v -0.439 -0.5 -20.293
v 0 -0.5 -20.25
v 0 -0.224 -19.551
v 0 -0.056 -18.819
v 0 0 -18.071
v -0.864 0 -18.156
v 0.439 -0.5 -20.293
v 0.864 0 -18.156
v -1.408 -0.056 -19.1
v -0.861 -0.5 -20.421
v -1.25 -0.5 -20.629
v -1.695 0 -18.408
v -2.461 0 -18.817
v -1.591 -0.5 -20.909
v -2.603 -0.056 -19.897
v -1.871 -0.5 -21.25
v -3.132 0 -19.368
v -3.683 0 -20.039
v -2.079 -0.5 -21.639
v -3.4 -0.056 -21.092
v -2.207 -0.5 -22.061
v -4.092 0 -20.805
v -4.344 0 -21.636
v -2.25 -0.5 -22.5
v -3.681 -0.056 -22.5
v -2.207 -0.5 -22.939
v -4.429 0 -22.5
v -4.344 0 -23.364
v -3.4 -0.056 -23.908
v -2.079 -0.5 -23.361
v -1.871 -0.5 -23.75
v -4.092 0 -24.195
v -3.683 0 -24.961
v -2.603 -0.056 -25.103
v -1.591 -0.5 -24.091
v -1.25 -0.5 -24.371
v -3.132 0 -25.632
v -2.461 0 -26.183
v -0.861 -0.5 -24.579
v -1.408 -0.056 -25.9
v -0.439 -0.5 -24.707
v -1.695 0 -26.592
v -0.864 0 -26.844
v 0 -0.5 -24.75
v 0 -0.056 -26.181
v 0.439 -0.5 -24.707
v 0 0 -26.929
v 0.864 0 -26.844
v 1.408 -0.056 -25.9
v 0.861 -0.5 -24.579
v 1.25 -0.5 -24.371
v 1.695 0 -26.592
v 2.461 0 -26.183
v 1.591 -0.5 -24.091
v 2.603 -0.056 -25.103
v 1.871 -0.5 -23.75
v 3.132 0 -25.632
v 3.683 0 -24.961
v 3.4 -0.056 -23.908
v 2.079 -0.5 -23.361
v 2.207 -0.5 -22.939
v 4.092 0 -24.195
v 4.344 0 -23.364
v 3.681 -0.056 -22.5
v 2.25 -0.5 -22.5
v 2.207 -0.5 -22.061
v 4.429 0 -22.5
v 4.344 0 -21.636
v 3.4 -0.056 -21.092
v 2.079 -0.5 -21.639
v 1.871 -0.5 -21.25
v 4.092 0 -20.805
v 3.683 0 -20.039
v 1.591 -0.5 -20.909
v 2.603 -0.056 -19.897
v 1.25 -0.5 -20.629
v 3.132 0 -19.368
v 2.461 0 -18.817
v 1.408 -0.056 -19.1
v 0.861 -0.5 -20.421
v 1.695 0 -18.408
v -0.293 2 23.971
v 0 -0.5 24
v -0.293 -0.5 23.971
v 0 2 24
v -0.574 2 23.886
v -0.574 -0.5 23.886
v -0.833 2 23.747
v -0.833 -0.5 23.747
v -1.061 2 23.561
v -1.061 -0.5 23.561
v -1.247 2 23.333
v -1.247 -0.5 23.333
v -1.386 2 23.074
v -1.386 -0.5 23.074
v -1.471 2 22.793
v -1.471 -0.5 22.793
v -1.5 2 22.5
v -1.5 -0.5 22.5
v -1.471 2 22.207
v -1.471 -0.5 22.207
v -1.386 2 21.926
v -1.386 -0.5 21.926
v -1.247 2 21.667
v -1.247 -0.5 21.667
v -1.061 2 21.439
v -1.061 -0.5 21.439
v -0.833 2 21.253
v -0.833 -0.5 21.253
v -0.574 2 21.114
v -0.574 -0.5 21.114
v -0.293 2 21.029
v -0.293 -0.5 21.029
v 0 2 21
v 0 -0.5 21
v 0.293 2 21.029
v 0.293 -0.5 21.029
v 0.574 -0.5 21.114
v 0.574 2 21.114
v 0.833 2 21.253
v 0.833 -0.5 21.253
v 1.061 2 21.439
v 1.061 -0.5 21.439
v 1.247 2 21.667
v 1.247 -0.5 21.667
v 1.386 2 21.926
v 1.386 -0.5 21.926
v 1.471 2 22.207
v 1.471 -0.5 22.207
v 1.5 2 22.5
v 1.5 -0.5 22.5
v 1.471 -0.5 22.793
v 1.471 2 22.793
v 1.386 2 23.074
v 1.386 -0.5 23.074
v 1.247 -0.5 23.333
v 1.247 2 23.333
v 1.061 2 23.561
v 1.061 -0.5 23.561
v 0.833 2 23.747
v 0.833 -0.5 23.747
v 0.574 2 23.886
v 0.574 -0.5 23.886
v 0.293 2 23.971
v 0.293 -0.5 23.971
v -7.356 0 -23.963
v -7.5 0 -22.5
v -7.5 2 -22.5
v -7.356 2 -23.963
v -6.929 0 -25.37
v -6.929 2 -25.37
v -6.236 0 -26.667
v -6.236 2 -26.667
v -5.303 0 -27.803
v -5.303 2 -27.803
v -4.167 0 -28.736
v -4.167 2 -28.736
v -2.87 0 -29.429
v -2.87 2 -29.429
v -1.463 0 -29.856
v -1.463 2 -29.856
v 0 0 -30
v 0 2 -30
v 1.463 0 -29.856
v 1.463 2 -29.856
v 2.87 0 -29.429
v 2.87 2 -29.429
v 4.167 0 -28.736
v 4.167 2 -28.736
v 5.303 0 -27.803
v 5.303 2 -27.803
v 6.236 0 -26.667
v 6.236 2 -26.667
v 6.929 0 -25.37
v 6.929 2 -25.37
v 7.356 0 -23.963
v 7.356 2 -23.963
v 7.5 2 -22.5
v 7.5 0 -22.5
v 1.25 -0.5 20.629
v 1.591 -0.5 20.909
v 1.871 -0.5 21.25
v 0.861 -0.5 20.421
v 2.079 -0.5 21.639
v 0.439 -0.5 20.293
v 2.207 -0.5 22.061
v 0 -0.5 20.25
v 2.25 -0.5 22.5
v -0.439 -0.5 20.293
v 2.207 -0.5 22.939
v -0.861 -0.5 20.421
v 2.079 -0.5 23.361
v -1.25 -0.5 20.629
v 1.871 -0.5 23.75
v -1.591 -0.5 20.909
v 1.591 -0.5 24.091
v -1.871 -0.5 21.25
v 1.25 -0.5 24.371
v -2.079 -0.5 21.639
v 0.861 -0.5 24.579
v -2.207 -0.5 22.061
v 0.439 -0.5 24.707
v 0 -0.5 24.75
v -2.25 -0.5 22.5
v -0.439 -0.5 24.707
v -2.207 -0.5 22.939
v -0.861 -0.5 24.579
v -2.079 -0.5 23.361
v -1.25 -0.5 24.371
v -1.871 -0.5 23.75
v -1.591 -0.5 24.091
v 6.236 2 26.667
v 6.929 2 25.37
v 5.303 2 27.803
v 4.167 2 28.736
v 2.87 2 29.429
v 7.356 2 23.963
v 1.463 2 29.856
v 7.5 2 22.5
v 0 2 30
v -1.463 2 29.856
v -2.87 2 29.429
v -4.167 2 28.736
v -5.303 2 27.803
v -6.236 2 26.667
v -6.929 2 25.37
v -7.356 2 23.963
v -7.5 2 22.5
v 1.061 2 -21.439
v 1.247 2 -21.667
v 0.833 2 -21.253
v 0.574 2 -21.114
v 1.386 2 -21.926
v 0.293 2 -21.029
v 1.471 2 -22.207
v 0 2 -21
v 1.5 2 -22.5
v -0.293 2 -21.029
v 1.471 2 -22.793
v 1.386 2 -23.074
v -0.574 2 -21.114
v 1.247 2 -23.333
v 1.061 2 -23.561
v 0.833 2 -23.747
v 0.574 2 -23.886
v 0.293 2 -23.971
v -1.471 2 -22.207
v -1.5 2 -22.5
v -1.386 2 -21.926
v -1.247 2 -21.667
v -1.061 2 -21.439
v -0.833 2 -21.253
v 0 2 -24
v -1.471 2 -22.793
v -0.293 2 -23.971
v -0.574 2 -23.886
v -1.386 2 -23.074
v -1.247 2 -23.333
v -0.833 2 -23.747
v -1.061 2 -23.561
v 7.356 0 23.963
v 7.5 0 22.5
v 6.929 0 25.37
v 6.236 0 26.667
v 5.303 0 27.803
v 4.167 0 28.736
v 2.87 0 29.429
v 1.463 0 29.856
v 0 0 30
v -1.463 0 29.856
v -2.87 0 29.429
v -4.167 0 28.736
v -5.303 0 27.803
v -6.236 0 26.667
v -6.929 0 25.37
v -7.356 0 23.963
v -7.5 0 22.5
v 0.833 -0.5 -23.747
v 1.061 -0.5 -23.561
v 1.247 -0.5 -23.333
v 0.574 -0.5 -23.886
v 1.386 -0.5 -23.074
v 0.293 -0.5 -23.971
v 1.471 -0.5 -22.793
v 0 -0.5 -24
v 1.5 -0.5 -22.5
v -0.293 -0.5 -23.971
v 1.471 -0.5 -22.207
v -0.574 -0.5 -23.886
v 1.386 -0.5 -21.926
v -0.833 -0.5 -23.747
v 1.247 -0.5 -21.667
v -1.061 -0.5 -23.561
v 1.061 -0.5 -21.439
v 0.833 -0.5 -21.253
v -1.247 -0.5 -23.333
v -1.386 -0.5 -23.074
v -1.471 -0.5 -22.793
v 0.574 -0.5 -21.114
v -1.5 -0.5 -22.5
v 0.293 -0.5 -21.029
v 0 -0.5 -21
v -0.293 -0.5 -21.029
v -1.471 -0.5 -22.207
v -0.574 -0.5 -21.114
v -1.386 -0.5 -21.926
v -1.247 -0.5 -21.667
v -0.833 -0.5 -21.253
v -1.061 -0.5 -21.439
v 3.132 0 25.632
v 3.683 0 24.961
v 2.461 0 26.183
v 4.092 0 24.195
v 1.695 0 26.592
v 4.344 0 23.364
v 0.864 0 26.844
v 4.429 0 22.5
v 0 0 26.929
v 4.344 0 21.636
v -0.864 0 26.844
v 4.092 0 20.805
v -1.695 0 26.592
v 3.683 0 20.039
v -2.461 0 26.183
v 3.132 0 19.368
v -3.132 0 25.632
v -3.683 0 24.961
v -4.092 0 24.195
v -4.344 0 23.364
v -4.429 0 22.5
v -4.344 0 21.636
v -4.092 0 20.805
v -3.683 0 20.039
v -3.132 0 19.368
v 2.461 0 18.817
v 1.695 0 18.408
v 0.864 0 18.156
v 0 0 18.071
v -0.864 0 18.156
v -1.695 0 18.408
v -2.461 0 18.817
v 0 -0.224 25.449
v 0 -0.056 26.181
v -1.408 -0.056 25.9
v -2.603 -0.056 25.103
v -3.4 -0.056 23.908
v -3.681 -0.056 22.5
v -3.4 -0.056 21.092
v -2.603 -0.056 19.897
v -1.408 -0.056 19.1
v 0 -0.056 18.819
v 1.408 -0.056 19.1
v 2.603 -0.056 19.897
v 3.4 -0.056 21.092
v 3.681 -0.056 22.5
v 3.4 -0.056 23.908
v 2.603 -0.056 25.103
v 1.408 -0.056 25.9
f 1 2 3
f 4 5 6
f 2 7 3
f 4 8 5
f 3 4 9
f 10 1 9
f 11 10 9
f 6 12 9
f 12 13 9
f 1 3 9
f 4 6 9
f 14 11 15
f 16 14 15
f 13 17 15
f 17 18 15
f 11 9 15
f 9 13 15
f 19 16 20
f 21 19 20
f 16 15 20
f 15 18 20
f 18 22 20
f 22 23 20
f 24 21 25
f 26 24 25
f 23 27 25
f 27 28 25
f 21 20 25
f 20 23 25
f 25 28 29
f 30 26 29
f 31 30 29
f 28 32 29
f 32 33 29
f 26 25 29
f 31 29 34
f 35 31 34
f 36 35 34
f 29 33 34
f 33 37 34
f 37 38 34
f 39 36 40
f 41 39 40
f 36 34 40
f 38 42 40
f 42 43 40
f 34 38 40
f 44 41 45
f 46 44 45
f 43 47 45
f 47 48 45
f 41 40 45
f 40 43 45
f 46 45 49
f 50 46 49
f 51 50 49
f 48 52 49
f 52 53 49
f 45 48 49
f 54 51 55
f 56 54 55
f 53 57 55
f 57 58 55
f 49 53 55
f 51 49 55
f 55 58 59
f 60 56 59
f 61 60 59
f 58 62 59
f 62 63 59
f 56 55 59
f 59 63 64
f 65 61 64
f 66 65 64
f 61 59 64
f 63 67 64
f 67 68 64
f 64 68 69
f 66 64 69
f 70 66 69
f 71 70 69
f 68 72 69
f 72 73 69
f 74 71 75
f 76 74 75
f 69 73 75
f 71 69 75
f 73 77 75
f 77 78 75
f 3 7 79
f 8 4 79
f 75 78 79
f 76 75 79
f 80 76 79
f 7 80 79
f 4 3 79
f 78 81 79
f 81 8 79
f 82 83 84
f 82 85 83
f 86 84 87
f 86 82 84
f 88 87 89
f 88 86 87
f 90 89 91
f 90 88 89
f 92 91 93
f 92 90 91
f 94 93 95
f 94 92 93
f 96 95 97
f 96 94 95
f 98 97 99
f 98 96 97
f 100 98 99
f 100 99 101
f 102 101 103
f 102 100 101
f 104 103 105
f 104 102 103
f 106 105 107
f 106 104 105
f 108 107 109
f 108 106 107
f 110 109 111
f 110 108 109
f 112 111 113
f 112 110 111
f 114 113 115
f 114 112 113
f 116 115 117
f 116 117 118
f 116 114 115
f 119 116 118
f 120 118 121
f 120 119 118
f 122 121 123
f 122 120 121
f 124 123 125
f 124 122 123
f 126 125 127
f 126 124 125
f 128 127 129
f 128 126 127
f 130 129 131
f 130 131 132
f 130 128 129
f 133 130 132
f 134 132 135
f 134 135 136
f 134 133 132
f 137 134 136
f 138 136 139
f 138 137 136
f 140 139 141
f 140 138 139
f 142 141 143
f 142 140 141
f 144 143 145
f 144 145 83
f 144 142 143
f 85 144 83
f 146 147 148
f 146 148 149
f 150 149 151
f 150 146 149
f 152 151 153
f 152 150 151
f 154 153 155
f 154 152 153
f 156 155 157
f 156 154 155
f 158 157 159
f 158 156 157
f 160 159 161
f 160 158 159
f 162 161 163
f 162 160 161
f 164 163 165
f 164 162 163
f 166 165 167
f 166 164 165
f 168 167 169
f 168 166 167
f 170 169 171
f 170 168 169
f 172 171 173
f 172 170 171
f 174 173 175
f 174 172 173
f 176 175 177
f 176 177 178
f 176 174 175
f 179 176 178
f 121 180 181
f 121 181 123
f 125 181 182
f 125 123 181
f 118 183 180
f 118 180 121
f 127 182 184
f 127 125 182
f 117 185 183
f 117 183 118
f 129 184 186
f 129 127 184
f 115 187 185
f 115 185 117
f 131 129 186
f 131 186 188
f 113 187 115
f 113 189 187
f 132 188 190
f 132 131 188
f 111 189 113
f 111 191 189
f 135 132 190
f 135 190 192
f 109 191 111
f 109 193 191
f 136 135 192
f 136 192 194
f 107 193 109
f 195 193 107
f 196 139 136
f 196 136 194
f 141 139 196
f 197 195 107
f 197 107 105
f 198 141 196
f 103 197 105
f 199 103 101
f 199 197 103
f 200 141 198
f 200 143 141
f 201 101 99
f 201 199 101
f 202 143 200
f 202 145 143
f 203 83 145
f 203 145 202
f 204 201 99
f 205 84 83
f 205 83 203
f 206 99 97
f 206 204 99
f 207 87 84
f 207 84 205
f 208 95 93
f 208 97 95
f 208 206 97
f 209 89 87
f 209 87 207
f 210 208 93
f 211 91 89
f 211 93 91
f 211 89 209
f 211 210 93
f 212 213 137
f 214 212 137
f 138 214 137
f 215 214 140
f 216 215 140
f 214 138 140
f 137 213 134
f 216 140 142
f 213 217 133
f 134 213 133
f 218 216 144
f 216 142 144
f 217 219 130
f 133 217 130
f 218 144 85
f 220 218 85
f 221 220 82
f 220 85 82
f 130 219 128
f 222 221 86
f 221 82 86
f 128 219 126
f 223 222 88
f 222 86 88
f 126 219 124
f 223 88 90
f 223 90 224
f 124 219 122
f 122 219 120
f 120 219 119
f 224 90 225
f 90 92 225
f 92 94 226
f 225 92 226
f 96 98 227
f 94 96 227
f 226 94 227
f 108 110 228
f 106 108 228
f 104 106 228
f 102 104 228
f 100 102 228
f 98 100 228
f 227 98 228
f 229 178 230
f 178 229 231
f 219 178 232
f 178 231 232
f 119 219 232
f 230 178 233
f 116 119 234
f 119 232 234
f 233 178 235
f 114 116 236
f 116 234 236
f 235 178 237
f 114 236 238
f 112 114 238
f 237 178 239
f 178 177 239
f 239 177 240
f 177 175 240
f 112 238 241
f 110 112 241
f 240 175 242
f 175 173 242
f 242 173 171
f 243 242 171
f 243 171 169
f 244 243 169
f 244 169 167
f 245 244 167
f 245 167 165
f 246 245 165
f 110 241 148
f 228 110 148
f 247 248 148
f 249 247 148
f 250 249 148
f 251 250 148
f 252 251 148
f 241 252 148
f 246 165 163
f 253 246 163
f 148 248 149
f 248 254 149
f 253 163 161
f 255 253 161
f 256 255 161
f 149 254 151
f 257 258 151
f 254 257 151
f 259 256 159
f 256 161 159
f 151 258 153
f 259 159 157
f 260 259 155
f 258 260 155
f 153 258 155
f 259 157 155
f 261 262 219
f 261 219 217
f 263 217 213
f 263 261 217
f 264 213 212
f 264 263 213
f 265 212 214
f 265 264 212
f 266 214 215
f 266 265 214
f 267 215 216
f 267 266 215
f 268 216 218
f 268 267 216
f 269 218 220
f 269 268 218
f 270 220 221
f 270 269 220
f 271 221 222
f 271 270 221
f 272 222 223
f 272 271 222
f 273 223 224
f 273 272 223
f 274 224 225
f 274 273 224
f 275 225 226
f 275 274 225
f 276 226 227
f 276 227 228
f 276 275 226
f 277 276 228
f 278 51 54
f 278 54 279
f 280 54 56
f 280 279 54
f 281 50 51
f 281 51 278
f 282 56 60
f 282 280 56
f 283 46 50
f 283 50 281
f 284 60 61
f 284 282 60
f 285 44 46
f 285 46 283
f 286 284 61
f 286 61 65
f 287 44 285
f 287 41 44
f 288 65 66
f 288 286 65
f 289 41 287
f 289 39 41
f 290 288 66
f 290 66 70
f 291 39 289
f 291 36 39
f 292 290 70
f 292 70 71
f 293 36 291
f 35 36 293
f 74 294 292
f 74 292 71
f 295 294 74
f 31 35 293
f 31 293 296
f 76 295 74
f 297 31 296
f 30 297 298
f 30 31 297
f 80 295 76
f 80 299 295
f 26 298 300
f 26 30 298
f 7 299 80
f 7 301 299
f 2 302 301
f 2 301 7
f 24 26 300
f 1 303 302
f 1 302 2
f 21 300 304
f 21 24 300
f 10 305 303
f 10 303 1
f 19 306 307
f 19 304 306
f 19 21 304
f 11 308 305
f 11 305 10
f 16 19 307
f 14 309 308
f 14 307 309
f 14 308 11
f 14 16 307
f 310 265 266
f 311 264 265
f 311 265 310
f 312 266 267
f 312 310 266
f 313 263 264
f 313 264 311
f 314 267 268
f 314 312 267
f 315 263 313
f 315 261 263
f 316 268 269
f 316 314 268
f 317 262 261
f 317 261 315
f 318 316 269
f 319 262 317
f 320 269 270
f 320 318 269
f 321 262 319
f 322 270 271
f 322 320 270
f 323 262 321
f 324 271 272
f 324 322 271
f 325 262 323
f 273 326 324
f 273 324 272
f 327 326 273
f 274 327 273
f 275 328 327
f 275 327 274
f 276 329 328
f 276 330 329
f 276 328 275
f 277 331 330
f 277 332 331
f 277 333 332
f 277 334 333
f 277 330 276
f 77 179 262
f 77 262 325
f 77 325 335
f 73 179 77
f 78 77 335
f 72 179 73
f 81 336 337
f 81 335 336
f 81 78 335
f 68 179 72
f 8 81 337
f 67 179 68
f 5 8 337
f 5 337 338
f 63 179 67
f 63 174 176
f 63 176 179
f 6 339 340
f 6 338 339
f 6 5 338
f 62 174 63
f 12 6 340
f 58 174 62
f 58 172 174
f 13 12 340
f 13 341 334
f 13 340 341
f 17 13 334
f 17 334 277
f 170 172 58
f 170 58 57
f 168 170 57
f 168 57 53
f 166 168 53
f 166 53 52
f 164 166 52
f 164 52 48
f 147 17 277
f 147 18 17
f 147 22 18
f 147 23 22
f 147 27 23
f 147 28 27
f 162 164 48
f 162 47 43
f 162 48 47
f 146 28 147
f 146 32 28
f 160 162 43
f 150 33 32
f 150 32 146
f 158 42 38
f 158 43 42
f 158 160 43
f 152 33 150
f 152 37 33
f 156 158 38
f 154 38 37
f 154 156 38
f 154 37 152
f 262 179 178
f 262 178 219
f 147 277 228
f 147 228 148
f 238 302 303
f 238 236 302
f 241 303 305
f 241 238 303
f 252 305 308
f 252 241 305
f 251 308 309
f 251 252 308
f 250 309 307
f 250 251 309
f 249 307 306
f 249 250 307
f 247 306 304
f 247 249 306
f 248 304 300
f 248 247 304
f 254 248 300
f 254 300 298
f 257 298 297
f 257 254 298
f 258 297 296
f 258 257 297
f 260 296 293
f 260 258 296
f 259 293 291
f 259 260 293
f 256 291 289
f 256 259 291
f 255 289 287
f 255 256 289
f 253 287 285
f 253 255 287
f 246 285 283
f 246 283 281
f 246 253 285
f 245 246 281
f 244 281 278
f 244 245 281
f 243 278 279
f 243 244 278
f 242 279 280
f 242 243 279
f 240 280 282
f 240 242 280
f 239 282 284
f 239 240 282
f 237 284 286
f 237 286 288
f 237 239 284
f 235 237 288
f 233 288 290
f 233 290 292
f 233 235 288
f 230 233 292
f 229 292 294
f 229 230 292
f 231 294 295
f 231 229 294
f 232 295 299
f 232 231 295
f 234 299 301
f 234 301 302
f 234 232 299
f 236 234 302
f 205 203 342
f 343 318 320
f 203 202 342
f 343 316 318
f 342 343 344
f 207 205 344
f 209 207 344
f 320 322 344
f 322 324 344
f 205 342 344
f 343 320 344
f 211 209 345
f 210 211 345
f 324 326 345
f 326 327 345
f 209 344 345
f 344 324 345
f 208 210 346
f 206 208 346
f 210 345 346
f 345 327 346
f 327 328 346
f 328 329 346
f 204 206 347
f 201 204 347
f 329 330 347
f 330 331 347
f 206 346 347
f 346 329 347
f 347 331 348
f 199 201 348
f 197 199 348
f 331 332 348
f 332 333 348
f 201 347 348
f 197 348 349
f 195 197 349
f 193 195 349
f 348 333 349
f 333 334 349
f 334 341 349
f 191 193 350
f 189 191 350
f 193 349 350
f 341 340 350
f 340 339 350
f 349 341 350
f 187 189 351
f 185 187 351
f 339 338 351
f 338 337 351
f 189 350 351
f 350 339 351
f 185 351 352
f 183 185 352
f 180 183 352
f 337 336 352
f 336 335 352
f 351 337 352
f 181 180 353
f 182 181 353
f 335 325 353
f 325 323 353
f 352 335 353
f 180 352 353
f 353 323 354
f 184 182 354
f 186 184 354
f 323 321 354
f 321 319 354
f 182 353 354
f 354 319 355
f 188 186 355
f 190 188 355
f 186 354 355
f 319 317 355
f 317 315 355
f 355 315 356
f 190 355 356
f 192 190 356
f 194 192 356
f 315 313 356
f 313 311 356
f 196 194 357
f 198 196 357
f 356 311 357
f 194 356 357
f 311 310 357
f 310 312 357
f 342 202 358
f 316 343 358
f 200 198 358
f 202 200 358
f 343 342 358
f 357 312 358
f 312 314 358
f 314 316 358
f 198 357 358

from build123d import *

# Parameters (mm, degrees)
BOSS_EXTRUDE1_DEPTH = 2
SKETCH2_R           = 1.5
CUT_EXTRUDE1_DEPTH  = 31.987900865
SKETCH3_R           = 2.25
SKETCH3_R_2         = 1.5
BOSS_EXTRUDE2_DEPTH = 0.5
FILLET1_R           = 5


with BuildPart() as part:
    # Sketch1 → Boss-Extrude1 (new body)
    with BuildSketch(Plane(origin=(0, 0, 0), x_dir=(1, 0, 0), z_dir=(0, 1, 0))):
        with BuildLine():
            Line((7.5, 22.5), (7.5, -22.5))
            ThreePointArc((7.5, -22.5), (0, -30), (-7.5, -22.5))
            Line((-7.5, -22.5), (-7.5, 22.5))
            ThreePointArc((-7.5, 22.5), (0, 30), (7.5, 22.5))
        make_face()
    extrude(amount=BOSS_EXTRUDE1_DEPTH)

    # Sketch2 → Cut-Extrude1 (cut, through all)
    with BuildSketch(Plane(origin=(0, 2, 0), x_dir=(1, 0, 0), z_dir=(0, 1, 0))):
        with Locations(Location((0, 22.5, 0), (0, 0, 270))):
            Circle(SKETCH2_R)
        with Locations(Location((0, -22.5, 0), (0, 0, 270))):
            Circle(SKETCH2_R)
    extrude(amount=-CUT_EXTRUDE1_DEPTH, mode=Mode.SUBTRACT)

    # Sketch3 → Boss-Extrude2 (add)
    # profile 1 of 2: a face of its own
    with BuildSketch(Plane.XZ):
        with Locations(Location((0, 22.5, 0), (0, 0, 90))):
            Circle(SKETCH3_R)
        with Locations(Location((0, 22.5, 0), (0, 0, 90))):
            Circle(SKETCH3_R_2, mode=Mode.SUBTRACT)
    # profile 2 of 2: a face of its own
    with BuildSketch(Plane.XZ):
        with Locations(Location((0, -22.5, 0), (0, 0, 90))):
            Circle(SKETCH3_R)
        with Locations(Location((0, -22.5, 0), (0, 0, 90))):
            Circle(SKETCH3_R_2, mode=Mode.SUBTRACT)
    extrude(amount=BOSS_EXTRUDE2_DEPTH)

    # Fillet1
    # the kernel refuses this fillet: 5 mm, written as the material it adds along each edge
    with BuildSketch(Plane(origin=(0, 0, 22.5), x_dir=(0, 0, 1), z_dir=(1, 0, 0))) as fillet1_piece_1:
        with BuildLine():
            CenterArc((4.429449472, 5), FILLET1_R, 244.158067237, 25.841932763)
            Line((2.25, 0.5), (2.206411011, 0.41))
            ThreePointArc((2.206411011, 0.41), (2.15, 0.25), (2.15, 0))
            Line((2.15, 0), (2.25, -0.1))
            Line((2.25, -0.1), (4.429449472, -0.1))
            Line((4.429449472, -0.1), (4.429449472, 0))
        make_face()
    revolve(axis=Axis((0, 0, 22.5), (0, -1, 0)))
    with BuildSketch(Plane(origin=(0, 0, -22.5), x_dir=(0, 0, 1), z_dir=(1, 0, 0))) as fillet1_piece_2:
        with BuildLine():
            CenterArc((4.429449472, 5), FILLET1_R, 244.158067237, 25.841932763)
            Line((2.25, 0.5), (2.206411011, 0.41))
            ThreePointArc((2.206411011, 0.41), (2.15, 0.25), (2.15, 0))
            Line((2.15, 0), (2.25, -0.1))
            Line((2.25, -0.1), (4.429449472, -0.1))
            Line((4.429449472, -0.1), (4.429449472, 0))
        make_face()
    revolve(axis=Axis((0, 0, -22.5), (0, -1, 0)))


solid = part.part
